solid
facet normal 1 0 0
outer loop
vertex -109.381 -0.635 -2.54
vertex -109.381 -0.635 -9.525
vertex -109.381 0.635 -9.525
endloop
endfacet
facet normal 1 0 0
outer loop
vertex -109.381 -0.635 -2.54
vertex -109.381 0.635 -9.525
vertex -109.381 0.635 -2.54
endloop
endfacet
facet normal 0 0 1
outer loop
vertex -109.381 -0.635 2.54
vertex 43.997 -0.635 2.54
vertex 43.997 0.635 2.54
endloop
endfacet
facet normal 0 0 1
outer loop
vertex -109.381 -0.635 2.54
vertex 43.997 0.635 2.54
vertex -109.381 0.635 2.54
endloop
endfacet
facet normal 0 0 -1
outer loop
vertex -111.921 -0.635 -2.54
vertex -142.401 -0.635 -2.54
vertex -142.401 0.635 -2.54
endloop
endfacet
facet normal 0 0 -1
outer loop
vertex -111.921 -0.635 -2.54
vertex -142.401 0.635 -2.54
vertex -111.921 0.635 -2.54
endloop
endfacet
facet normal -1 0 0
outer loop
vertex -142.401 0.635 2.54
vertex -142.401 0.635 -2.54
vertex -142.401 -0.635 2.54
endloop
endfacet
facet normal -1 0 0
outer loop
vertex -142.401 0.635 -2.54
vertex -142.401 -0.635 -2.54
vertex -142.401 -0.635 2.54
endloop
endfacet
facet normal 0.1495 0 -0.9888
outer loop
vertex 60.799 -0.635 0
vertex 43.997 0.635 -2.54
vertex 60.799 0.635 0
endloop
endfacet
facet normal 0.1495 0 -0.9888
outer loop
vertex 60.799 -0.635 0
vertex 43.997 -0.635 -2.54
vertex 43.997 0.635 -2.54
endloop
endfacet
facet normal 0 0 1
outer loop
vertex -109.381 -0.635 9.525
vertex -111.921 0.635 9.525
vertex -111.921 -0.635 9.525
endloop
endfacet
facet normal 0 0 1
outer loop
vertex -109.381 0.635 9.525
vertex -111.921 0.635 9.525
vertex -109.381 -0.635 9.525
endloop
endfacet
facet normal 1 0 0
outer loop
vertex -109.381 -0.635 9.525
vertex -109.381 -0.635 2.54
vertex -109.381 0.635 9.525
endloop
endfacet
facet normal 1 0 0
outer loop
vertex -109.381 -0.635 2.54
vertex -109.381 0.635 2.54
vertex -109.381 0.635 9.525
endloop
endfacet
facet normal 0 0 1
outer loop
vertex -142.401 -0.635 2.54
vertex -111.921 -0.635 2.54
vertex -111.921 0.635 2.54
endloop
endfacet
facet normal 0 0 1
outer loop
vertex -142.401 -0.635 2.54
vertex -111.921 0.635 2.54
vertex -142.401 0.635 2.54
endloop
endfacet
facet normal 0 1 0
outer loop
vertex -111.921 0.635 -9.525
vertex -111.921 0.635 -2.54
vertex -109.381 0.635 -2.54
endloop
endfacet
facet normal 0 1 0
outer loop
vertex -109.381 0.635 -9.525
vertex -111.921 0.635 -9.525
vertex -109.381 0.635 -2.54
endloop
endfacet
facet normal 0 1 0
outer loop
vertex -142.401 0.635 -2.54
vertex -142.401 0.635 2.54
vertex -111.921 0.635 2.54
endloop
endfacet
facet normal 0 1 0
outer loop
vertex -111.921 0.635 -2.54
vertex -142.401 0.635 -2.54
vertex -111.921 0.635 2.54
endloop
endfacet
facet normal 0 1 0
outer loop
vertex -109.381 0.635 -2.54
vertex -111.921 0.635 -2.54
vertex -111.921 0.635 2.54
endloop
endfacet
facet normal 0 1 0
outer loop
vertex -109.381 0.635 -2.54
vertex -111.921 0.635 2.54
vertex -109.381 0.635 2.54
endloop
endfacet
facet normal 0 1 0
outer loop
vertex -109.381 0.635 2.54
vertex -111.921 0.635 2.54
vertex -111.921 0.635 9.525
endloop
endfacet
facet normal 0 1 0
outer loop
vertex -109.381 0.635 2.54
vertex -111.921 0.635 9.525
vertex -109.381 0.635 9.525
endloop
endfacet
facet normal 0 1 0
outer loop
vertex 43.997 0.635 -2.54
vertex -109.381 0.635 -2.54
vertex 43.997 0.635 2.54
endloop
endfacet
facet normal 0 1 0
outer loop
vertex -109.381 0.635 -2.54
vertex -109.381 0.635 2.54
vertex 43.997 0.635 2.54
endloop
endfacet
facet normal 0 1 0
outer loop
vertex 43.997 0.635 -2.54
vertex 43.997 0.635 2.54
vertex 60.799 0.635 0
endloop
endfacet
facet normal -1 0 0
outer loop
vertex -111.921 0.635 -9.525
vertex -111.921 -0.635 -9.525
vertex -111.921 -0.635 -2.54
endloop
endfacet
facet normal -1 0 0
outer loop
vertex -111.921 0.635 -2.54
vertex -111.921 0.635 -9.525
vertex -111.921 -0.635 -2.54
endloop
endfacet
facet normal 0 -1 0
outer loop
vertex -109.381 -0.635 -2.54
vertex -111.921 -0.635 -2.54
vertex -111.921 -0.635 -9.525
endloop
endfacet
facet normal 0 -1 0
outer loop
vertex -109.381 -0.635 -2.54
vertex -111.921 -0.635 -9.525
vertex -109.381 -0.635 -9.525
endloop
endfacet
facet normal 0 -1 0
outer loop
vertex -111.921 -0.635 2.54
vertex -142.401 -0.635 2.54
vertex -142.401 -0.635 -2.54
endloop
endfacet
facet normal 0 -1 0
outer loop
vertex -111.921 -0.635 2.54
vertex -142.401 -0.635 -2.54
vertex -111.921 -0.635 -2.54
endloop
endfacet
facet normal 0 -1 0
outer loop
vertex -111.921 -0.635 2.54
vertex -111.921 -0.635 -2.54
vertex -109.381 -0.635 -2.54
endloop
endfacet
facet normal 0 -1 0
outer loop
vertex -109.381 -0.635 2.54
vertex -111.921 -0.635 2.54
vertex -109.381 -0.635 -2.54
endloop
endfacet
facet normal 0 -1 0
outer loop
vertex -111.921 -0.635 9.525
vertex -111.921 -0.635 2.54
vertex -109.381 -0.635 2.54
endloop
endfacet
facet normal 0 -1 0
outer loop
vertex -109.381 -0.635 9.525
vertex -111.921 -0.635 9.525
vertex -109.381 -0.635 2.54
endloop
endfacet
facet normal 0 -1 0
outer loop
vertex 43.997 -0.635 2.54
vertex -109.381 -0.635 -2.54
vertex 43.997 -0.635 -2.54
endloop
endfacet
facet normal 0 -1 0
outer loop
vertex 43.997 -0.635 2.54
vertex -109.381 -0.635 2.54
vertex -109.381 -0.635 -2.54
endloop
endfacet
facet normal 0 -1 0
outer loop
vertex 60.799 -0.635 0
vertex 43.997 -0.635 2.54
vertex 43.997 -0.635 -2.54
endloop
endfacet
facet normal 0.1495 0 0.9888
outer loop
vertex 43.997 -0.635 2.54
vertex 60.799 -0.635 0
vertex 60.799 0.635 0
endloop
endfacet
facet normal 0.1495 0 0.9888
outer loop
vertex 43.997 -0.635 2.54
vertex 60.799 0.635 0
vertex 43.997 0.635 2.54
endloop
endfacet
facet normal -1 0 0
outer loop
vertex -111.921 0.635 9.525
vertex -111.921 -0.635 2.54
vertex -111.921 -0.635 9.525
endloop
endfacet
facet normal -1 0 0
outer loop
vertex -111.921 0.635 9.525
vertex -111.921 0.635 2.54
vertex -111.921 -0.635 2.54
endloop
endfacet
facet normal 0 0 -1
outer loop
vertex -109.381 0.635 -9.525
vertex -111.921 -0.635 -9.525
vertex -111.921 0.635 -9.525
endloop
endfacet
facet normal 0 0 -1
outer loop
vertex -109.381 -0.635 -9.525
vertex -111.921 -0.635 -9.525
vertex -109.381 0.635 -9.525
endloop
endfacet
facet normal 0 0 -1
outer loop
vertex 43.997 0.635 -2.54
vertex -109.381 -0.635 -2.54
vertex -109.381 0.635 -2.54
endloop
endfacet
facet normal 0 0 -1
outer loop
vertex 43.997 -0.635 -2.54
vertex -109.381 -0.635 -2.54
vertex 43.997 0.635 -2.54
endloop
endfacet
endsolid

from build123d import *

# Parameters (mm, degrees)
F0_W     = 30.48
F0_H     = 5.08
F0_W_2   = 2.54
F1_DEPTH = 0.635
F0_H_2   = 6.985
F2_DEPTH = 0.635


with BuildPart() as f1:
    # F0 (on Front) → F1 (new body, symmetric)
    with BuildSketch(Plane.XZ):
        Polygon((-109.3809070776, 2.54), (-109.3809070776, -2.54), (43.9970903099, -2.54), (60.7990929224, 0), (43.9970903099, 2.54), align=None)
        with Locations((-127.1609070776, 0)):
            Rectangle(F0_W, F0_H)
        with Locations((-110.6509070776, 0)):
            Rectangle(F0_W_2, F0_H)
    extrude(amount=F1_DEPTH, both=True)

    # F0 (on Front) → F2 (join, symmetric)
    with BuildSketch(Plane.XZ):
        with Locations((-110.6509070776, 6.0325)):
            Rectangle(F0_W_2, F0_H_2)
        with Locations((-110.6509070776, -6.0325)):
            Rectangle(F0_W_2, F0_H_2)
    extrude(amount=F2_DEPTH, both=True)


solid = f1.part
